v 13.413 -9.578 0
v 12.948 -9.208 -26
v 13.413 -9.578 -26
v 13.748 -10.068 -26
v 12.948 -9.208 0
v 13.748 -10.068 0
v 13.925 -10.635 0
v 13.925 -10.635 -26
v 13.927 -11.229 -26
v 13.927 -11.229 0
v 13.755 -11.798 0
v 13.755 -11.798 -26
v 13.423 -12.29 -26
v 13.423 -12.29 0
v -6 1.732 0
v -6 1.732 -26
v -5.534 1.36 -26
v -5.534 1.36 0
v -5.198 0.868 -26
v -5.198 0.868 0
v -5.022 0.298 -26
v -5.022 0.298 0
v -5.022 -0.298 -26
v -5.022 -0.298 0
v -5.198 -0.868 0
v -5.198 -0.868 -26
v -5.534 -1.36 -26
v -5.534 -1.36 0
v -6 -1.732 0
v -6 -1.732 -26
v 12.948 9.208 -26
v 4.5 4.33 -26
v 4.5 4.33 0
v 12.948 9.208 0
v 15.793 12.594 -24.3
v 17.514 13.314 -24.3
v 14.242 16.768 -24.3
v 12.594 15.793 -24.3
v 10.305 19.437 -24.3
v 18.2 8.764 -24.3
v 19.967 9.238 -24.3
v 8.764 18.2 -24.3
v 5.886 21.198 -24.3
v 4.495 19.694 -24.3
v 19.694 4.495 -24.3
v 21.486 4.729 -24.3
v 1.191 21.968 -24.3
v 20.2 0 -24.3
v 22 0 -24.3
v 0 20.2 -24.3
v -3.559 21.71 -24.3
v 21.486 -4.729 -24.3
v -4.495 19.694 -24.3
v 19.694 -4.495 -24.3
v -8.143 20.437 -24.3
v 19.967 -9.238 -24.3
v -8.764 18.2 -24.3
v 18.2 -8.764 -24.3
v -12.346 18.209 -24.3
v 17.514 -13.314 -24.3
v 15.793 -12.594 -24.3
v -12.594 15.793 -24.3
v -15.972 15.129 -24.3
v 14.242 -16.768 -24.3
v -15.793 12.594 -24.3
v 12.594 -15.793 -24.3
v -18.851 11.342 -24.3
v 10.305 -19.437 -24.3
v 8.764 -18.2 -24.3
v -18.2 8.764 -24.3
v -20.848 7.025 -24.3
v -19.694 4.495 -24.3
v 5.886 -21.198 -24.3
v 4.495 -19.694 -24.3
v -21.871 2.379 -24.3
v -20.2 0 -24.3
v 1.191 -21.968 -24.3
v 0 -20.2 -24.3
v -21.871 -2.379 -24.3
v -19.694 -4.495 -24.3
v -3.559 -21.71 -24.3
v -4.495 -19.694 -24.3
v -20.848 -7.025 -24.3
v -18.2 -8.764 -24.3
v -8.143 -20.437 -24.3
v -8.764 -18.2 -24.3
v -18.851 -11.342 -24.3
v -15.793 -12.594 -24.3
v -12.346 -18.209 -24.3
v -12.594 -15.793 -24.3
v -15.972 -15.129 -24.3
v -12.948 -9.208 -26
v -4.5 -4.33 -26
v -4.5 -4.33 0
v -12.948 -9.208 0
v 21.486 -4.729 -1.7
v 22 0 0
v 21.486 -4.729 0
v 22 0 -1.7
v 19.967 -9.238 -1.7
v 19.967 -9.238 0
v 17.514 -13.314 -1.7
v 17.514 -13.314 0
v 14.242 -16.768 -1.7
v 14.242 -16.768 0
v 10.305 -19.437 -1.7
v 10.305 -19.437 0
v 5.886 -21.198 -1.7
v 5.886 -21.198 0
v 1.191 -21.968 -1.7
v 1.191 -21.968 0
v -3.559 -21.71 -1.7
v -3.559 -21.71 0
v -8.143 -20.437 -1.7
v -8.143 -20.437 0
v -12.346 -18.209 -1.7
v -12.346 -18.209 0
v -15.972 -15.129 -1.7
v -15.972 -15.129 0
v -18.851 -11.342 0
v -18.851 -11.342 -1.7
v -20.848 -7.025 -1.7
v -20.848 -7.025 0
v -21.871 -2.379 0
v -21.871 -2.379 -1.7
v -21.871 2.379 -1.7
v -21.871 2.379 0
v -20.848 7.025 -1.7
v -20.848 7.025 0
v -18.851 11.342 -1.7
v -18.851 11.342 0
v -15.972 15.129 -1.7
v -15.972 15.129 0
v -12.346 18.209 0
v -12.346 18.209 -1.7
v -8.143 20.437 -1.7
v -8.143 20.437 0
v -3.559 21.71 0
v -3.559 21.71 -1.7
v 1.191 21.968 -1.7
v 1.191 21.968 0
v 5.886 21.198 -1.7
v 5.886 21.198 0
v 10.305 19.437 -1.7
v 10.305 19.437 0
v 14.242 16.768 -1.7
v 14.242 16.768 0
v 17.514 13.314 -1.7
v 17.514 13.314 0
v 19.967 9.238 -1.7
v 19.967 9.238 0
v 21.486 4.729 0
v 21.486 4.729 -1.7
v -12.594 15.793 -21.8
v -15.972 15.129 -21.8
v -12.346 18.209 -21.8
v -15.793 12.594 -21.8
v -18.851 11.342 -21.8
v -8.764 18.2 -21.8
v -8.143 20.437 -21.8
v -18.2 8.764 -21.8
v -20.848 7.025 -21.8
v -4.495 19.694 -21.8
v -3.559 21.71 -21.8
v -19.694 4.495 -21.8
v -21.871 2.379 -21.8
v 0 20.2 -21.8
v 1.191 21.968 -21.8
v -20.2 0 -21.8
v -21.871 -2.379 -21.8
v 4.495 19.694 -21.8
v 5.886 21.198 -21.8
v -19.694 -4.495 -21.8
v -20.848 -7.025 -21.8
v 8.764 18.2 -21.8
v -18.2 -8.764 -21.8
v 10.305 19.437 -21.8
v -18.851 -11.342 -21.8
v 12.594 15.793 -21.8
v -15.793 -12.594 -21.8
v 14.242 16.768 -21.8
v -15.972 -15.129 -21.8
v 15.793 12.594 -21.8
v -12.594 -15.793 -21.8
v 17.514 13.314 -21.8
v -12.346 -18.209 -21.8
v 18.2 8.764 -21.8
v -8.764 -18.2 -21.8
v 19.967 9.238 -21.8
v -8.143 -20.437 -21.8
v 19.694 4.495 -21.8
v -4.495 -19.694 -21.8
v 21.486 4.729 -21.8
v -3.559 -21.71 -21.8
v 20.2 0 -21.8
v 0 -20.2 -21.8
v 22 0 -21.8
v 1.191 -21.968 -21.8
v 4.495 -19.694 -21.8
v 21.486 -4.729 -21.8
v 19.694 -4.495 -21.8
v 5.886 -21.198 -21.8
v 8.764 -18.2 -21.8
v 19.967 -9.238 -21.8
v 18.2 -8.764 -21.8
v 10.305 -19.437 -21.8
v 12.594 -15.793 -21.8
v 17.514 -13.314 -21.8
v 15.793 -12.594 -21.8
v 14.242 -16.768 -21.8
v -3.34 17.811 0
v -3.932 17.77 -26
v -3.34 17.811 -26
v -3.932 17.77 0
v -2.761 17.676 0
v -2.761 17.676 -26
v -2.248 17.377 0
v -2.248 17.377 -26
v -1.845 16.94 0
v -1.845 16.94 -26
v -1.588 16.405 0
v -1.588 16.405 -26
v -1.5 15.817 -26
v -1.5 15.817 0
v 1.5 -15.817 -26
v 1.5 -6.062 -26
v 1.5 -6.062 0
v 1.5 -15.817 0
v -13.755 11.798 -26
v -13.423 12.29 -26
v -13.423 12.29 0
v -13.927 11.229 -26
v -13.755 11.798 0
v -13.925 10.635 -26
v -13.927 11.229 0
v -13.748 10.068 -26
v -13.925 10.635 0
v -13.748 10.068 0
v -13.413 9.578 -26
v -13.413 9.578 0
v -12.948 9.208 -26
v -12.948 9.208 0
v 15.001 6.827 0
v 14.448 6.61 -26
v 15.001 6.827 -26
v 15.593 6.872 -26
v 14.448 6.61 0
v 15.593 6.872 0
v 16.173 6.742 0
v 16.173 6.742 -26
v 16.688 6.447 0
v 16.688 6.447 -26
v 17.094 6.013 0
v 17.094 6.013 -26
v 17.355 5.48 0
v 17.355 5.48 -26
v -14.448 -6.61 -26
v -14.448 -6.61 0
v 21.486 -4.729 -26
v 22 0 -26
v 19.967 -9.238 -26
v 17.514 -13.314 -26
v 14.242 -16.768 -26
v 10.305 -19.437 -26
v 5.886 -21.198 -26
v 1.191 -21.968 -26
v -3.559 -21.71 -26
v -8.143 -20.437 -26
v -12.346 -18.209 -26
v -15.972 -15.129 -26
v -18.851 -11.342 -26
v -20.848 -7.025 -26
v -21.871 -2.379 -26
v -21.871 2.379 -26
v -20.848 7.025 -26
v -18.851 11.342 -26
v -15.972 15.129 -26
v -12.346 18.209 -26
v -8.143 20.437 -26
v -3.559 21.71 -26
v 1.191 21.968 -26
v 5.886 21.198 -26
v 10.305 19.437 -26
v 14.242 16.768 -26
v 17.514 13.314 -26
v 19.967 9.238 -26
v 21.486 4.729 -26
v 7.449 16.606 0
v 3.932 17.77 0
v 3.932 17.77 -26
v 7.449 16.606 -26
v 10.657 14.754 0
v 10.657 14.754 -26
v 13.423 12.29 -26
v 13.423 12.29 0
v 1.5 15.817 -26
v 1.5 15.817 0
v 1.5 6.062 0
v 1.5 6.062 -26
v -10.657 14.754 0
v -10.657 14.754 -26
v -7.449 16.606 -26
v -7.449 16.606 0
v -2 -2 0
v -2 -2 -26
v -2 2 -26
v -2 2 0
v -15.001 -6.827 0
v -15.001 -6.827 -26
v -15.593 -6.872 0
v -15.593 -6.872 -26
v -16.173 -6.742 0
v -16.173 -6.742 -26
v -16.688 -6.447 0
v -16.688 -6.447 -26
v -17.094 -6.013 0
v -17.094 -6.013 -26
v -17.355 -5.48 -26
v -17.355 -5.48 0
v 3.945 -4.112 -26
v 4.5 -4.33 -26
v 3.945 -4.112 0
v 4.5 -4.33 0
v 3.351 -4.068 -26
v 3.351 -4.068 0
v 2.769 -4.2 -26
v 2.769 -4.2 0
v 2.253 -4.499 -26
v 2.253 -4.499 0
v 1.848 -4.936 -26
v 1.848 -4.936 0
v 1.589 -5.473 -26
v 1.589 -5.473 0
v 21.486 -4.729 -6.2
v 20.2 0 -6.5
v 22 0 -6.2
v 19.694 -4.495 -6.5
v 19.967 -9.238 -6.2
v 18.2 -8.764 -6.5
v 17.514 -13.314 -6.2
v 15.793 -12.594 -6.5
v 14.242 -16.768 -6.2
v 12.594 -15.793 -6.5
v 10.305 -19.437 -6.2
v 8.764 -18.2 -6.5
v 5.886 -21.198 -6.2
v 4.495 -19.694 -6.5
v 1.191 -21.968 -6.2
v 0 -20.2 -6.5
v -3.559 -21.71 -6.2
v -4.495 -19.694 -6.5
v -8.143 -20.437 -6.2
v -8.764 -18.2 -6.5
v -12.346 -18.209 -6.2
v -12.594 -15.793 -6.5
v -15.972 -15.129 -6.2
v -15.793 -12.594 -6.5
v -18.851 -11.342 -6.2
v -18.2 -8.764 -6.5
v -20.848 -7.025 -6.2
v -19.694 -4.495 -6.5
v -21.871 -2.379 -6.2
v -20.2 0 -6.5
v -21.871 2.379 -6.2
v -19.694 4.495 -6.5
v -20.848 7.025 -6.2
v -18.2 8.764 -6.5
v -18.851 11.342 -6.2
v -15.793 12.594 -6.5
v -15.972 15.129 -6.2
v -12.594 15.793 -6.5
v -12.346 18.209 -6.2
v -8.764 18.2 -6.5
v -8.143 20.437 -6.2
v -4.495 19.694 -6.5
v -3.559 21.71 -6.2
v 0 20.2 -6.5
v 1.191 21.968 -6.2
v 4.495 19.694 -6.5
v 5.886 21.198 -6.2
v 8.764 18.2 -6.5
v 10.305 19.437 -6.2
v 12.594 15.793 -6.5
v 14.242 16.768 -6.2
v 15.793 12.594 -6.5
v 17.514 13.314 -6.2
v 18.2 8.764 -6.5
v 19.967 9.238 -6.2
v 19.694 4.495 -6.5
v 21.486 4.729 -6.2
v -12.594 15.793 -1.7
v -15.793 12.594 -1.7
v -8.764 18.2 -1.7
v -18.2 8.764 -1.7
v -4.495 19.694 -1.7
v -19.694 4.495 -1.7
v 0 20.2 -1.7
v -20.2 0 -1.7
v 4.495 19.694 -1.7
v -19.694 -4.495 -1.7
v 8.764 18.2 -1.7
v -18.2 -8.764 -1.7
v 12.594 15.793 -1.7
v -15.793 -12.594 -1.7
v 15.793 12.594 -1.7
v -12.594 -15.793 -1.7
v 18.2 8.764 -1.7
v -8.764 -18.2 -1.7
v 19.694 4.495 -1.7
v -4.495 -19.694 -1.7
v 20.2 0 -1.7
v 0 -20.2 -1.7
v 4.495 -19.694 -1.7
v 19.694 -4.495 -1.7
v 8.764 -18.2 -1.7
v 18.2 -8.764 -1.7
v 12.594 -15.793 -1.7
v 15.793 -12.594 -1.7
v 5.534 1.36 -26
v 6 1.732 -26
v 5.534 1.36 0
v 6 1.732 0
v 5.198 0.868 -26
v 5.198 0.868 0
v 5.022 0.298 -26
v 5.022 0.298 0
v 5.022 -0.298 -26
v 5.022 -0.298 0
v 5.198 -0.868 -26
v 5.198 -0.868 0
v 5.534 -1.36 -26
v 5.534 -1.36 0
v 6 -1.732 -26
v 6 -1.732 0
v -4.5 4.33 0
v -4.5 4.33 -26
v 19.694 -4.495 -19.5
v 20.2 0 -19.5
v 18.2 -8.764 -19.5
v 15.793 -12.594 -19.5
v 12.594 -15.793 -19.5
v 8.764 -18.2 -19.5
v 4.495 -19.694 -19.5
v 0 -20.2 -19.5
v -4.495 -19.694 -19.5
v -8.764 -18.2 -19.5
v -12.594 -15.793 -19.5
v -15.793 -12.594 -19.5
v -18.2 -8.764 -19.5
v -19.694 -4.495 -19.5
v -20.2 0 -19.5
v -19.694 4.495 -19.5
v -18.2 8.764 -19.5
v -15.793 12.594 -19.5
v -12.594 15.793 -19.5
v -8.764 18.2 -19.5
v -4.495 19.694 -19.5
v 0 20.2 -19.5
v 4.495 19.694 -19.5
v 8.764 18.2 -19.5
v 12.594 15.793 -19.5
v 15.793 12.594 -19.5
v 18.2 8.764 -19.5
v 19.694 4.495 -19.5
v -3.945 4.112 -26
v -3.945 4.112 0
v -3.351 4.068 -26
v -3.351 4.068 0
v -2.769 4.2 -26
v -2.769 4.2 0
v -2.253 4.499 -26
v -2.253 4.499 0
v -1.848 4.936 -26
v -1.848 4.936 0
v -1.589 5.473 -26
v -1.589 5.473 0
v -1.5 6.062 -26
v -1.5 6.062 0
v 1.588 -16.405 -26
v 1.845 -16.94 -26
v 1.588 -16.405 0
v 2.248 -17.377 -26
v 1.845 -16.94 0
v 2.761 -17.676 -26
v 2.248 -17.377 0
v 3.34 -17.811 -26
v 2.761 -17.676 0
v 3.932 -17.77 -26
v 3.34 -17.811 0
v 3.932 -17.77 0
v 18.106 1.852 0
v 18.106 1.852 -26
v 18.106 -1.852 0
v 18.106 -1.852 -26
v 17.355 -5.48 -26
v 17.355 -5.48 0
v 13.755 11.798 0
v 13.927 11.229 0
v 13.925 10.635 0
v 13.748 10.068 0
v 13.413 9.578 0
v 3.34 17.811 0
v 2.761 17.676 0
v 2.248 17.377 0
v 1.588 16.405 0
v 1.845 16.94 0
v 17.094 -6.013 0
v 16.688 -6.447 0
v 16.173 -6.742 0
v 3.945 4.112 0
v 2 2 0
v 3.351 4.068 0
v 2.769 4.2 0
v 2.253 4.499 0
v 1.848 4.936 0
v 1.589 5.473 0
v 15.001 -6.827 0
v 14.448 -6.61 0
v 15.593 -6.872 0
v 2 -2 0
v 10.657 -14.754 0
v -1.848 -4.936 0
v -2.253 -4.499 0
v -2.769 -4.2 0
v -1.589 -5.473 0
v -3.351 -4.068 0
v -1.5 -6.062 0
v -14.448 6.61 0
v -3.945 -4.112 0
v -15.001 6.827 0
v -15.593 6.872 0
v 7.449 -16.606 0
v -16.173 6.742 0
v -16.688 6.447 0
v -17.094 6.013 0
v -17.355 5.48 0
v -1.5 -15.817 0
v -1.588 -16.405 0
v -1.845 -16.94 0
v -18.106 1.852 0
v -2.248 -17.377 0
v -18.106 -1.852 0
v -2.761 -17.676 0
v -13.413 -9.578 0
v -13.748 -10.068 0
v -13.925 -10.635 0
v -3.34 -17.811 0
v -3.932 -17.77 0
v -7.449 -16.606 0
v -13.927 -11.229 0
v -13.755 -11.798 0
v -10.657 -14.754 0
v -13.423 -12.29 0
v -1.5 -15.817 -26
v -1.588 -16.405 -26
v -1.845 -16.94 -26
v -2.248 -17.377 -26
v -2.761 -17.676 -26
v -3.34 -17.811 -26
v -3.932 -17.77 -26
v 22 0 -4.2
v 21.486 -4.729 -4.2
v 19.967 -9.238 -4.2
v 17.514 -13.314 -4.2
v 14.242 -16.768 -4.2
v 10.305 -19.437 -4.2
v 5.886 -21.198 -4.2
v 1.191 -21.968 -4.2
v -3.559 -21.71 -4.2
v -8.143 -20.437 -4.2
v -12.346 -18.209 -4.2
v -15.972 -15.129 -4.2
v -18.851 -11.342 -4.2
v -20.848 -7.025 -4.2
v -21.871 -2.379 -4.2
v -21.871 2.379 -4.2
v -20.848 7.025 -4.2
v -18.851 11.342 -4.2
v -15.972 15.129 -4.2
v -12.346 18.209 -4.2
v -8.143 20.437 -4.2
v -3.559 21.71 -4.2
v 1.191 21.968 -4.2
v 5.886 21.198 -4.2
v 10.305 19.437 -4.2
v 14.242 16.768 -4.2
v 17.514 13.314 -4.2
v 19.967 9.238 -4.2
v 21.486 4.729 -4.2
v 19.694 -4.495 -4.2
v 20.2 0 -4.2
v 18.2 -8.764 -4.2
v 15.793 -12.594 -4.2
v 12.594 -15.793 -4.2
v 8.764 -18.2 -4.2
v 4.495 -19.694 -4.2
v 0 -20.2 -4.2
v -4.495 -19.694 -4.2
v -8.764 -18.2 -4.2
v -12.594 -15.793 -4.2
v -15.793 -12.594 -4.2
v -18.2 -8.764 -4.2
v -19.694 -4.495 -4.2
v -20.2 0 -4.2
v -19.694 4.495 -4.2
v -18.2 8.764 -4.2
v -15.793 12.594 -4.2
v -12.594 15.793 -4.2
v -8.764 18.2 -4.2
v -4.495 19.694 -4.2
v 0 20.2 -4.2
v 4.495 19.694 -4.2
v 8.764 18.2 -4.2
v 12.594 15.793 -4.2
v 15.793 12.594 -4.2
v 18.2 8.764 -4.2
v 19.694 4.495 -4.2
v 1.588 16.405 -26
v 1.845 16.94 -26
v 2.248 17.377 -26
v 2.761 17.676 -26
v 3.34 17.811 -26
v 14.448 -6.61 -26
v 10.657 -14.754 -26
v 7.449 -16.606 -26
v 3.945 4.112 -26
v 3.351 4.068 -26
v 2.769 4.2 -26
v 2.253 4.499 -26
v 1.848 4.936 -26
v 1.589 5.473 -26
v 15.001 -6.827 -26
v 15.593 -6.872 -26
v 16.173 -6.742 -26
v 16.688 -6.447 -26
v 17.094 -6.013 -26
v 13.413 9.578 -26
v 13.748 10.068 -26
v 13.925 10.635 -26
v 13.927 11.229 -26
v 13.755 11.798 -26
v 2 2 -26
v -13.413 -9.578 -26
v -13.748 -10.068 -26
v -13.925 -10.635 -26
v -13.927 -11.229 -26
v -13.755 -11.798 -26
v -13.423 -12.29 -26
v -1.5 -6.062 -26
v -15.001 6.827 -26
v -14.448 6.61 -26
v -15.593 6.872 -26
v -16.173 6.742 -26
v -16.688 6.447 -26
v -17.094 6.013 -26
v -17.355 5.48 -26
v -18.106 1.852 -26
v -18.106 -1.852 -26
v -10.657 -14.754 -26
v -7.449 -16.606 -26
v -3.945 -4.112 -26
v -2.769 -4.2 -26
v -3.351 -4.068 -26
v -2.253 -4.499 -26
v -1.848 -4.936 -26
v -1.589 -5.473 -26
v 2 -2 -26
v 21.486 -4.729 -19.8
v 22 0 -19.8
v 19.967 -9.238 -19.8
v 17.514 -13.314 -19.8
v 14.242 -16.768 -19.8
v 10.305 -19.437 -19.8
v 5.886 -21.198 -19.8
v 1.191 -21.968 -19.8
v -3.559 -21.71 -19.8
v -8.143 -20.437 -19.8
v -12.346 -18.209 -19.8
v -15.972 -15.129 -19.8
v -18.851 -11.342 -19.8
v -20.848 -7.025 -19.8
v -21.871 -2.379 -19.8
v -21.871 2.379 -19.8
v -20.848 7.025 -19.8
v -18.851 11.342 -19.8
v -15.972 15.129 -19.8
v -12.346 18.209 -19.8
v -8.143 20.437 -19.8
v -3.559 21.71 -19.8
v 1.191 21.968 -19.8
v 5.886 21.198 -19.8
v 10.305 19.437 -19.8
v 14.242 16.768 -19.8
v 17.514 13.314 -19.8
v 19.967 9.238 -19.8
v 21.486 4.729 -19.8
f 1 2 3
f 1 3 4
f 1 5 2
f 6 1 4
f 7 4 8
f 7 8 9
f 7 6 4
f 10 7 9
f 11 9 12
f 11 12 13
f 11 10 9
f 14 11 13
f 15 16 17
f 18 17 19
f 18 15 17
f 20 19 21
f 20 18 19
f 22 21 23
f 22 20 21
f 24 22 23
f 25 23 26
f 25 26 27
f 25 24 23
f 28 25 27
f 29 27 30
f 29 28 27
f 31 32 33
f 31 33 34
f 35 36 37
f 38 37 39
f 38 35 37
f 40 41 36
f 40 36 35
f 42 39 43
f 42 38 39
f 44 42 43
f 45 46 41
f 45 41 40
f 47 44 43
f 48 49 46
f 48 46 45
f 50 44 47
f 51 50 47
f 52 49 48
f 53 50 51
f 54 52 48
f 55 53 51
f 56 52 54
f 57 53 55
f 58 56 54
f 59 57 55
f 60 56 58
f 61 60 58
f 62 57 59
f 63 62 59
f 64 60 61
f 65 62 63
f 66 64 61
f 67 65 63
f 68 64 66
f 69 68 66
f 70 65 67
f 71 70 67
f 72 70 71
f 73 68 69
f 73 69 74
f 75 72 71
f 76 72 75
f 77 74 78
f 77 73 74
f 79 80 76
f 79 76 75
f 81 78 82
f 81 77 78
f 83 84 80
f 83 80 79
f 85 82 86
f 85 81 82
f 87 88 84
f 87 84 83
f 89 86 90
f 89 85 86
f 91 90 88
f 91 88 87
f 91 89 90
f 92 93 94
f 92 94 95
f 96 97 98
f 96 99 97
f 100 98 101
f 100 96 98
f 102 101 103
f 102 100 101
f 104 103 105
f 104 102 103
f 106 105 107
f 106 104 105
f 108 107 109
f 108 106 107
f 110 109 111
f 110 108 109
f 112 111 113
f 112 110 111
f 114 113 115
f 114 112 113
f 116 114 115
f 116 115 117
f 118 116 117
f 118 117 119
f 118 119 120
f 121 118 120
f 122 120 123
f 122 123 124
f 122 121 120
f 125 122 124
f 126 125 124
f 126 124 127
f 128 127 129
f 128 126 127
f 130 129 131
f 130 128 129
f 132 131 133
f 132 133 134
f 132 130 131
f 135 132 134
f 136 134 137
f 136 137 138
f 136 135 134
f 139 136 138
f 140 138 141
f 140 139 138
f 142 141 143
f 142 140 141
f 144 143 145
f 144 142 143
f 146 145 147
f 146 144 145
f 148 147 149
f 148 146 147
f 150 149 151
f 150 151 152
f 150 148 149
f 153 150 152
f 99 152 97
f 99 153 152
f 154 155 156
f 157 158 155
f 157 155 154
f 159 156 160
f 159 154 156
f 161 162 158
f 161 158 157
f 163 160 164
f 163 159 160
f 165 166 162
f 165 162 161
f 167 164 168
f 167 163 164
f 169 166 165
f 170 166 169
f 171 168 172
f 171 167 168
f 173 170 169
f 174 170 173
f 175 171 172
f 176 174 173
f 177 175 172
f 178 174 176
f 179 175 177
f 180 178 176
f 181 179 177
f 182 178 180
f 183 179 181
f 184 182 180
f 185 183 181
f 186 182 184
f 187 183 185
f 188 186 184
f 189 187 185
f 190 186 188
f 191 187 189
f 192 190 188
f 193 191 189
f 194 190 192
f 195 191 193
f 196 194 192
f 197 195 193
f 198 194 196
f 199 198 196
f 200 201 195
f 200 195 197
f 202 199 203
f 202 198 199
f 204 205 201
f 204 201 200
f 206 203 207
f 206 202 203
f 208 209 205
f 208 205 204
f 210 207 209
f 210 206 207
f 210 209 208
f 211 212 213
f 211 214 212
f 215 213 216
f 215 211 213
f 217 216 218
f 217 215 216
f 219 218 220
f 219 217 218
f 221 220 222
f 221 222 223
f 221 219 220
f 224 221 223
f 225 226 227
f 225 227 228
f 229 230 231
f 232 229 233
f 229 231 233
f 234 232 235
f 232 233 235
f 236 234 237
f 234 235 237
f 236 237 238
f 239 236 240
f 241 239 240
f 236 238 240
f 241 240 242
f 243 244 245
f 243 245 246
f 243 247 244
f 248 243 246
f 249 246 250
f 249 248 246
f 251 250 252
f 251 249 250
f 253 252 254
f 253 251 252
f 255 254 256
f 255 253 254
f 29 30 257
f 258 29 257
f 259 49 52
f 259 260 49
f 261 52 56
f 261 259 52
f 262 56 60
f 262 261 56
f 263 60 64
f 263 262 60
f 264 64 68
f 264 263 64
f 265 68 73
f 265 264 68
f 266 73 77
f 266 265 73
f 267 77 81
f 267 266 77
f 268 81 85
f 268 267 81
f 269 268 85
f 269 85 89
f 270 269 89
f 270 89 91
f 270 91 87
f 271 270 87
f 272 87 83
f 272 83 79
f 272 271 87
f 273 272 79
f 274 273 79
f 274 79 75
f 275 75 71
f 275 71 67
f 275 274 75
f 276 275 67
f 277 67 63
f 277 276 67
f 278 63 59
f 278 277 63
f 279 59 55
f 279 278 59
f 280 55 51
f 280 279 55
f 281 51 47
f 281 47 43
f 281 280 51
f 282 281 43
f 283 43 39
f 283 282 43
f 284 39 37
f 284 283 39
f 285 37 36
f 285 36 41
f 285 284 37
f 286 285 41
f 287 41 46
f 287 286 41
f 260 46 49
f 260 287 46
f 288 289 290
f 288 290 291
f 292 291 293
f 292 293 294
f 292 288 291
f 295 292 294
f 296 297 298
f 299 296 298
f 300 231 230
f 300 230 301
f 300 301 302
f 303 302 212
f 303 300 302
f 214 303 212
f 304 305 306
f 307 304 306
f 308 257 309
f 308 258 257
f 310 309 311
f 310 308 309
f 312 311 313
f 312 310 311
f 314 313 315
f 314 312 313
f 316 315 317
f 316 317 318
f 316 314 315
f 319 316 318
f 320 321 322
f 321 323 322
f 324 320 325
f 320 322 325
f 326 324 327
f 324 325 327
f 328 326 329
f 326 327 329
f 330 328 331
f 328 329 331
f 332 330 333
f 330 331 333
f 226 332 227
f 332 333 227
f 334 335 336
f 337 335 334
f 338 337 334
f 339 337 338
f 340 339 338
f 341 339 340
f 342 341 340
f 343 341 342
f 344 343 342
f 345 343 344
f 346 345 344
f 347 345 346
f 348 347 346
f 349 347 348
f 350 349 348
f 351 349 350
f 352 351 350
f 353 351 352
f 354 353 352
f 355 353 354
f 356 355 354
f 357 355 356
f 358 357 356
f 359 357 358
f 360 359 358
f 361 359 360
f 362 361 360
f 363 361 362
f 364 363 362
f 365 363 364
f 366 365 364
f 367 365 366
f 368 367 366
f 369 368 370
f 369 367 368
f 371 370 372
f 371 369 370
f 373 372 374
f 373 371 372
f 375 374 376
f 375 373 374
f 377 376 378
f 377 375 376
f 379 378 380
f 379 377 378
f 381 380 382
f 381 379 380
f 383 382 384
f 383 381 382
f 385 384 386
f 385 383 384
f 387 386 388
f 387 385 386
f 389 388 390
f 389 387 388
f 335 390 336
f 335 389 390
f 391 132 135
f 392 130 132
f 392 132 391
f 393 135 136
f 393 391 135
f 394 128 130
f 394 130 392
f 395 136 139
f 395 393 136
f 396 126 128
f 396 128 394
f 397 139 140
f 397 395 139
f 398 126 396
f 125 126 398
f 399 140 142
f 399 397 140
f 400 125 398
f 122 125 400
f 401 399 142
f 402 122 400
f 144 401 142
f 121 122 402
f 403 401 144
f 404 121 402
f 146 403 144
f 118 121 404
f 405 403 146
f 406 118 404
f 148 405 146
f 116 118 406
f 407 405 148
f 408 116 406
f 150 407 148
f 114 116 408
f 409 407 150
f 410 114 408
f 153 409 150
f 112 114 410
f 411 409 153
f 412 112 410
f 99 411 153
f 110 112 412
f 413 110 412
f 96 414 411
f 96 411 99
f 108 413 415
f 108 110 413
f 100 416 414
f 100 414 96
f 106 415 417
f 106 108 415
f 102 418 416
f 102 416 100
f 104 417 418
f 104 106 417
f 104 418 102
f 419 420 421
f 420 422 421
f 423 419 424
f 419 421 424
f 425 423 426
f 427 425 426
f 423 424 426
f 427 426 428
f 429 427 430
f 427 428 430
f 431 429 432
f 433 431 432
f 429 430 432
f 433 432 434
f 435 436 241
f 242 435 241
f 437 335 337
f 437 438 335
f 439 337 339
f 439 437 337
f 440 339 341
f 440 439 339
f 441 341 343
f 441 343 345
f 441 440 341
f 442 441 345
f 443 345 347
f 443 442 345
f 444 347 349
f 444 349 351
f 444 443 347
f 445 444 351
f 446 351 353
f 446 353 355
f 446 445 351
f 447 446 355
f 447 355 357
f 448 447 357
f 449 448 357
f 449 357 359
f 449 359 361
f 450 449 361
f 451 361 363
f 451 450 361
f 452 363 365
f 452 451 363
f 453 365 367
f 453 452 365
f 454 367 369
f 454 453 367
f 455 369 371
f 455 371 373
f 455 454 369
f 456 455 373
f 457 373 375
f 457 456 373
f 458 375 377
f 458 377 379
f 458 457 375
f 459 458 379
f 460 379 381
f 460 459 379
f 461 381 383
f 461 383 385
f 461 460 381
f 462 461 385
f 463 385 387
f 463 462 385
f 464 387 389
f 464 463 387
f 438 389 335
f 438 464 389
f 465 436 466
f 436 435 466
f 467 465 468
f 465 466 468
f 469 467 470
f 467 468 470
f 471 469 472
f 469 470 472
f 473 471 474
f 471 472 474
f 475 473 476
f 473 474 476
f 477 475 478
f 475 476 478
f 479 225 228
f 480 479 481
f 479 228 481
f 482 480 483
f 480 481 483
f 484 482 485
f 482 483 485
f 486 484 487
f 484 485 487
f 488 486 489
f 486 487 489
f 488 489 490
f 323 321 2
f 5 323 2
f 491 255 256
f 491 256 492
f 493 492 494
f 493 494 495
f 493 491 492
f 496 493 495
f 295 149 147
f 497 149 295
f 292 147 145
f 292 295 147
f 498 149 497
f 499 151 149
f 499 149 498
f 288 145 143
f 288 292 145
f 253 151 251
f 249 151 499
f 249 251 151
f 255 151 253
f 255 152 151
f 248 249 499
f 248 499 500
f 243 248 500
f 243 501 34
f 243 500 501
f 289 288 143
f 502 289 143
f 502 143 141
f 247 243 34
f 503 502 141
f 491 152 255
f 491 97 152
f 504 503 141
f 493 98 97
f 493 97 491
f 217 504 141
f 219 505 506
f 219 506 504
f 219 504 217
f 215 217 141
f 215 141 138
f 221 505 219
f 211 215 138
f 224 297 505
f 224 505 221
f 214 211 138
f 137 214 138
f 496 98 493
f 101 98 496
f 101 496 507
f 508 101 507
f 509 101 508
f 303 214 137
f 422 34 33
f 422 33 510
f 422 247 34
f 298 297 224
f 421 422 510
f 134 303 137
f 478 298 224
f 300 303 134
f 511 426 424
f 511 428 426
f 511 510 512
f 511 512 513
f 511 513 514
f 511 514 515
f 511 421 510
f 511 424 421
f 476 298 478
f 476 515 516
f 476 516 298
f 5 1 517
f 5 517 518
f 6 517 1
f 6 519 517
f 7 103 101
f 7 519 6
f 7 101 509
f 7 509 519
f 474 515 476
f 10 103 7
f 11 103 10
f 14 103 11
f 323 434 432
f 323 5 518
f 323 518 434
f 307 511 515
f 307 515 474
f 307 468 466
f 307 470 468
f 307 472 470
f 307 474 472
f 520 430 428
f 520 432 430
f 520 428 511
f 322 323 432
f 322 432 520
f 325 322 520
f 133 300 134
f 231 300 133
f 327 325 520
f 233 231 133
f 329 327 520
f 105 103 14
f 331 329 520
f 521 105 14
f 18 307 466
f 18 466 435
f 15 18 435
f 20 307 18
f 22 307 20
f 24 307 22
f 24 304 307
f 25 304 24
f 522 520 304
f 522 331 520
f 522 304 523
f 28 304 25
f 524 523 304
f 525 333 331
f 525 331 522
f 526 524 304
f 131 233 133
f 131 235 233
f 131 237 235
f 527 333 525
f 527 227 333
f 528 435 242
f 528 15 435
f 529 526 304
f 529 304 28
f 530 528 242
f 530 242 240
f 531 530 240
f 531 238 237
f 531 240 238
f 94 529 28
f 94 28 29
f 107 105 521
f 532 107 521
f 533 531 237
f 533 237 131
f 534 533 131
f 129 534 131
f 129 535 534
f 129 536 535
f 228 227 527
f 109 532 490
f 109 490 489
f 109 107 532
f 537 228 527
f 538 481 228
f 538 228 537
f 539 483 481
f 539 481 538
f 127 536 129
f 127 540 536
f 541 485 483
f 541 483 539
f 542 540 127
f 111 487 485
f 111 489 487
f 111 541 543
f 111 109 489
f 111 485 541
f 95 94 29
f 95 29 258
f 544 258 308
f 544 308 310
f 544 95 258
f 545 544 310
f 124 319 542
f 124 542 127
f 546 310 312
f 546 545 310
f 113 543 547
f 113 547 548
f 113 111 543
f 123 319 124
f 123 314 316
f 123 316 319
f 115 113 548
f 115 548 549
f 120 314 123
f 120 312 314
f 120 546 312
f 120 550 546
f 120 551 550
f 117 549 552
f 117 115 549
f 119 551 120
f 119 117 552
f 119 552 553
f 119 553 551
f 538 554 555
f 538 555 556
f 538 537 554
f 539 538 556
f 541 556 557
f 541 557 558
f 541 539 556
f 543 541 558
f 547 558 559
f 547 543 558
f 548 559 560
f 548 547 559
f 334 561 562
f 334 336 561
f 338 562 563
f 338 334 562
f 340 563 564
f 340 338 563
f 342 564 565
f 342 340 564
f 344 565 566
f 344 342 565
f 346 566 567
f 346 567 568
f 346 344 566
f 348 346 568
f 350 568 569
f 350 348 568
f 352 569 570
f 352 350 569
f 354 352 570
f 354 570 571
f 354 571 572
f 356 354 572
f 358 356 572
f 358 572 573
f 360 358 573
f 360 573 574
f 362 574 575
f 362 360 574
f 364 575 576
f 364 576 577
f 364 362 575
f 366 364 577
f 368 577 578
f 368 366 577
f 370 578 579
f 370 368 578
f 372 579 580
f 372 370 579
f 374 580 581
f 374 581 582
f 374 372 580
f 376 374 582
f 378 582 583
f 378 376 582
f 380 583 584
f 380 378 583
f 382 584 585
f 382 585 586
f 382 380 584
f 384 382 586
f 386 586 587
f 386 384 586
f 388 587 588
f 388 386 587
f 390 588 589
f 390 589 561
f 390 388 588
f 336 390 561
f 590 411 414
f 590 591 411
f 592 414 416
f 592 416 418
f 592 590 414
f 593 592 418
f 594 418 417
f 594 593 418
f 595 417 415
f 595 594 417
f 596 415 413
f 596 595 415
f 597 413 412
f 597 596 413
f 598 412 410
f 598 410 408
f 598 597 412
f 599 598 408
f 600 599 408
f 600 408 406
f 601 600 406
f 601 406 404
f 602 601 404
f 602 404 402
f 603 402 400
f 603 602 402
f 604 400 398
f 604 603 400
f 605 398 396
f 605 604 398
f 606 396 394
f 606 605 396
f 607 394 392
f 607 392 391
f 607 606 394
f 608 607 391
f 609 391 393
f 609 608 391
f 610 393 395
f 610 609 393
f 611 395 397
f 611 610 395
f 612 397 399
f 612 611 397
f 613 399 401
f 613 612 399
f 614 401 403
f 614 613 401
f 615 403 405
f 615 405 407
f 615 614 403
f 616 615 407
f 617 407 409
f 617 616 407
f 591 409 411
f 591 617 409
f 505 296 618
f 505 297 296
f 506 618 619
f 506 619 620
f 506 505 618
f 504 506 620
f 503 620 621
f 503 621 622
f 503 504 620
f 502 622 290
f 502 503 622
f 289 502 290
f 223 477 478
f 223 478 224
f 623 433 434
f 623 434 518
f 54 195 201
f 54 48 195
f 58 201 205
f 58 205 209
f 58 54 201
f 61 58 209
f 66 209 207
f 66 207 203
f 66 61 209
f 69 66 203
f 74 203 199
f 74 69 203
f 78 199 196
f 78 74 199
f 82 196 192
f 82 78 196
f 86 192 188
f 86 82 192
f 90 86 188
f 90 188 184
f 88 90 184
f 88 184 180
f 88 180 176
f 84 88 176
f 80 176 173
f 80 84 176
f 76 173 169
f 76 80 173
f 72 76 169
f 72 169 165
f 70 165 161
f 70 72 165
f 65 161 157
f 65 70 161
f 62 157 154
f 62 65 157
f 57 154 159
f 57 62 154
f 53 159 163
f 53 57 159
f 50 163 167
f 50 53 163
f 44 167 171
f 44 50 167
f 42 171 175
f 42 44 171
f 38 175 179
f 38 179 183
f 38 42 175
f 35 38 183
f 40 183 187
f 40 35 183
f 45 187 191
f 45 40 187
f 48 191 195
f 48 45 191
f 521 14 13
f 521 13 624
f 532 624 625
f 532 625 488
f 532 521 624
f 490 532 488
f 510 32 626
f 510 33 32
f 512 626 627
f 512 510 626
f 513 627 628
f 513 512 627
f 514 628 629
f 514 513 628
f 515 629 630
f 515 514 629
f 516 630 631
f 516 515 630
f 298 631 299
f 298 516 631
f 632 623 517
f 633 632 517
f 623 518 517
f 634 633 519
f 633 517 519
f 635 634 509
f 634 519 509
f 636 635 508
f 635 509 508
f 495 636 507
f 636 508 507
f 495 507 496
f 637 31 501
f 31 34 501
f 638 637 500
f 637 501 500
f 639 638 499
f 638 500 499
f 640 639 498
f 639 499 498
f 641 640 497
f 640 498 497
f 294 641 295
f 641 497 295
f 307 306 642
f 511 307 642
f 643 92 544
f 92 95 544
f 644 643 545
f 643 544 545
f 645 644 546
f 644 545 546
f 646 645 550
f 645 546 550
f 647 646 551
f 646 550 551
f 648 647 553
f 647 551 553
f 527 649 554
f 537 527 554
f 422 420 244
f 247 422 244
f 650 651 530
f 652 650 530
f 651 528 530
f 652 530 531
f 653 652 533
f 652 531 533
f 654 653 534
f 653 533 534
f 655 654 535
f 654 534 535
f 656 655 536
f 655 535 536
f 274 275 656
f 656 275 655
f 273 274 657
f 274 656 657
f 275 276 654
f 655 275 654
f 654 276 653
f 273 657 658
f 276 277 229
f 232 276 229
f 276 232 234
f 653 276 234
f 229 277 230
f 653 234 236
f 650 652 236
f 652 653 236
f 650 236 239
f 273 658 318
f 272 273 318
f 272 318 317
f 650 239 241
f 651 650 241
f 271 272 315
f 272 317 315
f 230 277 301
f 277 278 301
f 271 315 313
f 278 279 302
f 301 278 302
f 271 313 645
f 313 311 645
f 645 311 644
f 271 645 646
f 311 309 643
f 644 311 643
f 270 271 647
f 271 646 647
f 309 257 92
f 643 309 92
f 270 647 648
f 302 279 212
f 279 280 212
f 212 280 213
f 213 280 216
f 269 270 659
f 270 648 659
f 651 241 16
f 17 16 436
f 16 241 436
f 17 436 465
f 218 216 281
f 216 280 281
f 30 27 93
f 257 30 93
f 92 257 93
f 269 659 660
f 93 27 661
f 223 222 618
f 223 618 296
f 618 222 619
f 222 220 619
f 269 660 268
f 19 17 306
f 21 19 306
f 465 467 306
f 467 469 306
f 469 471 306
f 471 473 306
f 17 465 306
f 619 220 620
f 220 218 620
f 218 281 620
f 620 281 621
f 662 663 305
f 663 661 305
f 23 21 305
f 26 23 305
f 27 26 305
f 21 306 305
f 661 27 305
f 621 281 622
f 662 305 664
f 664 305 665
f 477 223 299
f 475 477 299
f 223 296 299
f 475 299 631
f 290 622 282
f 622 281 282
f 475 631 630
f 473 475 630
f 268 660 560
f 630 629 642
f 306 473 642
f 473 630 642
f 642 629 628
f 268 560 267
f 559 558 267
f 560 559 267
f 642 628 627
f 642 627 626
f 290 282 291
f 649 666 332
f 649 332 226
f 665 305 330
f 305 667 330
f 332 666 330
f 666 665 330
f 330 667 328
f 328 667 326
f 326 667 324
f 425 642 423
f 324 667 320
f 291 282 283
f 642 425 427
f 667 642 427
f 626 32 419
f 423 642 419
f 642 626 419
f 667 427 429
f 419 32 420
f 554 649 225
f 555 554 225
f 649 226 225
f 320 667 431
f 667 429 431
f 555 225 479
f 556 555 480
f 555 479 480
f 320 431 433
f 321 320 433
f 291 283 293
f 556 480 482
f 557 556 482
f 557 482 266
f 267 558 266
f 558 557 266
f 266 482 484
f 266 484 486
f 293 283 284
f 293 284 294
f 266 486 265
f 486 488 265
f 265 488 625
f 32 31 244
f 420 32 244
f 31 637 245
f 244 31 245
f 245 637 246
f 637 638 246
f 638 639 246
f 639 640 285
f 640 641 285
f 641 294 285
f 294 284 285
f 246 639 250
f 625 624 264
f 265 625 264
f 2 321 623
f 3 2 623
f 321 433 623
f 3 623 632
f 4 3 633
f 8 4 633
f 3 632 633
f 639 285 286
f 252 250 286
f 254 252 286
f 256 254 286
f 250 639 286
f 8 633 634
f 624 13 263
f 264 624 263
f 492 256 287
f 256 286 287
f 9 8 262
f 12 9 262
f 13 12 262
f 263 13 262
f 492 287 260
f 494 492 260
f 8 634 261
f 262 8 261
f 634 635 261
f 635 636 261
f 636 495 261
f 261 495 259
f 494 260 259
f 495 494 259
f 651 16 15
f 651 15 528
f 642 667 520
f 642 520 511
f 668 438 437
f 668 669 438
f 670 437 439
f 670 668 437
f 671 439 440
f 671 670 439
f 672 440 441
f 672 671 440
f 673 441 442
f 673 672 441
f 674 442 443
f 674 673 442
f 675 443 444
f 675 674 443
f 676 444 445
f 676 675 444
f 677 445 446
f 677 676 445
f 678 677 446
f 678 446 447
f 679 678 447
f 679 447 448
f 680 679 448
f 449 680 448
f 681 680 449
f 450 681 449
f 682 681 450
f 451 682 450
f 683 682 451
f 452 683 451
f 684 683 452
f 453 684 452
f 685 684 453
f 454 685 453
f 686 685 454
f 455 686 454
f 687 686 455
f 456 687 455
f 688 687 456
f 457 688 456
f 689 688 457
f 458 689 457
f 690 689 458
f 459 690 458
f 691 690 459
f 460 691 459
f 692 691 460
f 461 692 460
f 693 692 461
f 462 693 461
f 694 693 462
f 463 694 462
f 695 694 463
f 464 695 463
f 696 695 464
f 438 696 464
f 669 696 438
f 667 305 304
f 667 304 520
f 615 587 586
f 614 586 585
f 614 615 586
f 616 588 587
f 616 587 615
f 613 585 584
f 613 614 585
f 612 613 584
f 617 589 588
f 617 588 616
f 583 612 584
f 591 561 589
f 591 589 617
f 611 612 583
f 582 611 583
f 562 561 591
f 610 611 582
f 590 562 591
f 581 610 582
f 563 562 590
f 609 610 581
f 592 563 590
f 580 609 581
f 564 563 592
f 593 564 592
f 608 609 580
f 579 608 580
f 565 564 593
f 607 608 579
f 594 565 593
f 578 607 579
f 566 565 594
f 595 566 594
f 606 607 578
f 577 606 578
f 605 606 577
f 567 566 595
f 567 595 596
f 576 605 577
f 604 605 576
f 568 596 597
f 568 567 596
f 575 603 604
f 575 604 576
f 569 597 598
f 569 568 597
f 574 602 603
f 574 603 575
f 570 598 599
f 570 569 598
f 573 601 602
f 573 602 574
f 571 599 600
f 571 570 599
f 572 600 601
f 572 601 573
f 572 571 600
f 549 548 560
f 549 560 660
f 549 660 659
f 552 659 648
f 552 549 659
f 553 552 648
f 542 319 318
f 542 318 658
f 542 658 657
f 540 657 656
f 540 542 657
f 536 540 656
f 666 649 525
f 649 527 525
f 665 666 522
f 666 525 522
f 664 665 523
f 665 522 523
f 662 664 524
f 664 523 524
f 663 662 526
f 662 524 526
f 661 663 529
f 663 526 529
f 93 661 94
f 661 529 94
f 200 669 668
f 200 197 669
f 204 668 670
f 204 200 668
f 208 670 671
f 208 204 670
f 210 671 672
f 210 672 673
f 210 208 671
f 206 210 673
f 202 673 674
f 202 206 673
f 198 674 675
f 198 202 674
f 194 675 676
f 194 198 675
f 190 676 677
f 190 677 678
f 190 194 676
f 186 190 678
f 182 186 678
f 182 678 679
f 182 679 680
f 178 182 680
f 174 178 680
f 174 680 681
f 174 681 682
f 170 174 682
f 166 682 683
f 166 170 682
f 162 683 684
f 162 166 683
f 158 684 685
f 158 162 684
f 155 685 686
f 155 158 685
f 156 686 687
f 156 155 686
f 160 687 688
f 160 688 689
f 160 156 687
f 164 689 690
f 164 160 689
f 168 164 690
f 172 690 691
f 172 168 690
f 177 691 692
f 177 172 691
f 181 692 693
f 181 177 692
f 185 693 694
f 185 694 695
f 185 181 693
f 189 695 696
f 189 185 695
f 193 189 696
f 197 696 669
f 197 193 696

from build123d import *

# Parameters (mm, degrees)
SKETCH2_W               = 3
SKETCH2_H               = 18.2
BOSS_EXTRUDE1_DEPTH     = 26
CIRPATTERN1_COUNT       = 6
CUT_EXTRUDE1_DEPTH      = 41.546269865
CUT_EXTRUDE1_DEPTH_BACK = 41.546269865
SKETCH3_W               = 4
SKETCH3_H               = 4
FILLET1_R               = 2


with BuildPart() as part:
    # Sketch1 → Revolve1 (revolve)
    with BuildSketch(Plane(origin=(0, 0, 0), x_dir=(0, 0, -1), z_dir=(1, 0, 0)), mode=Mode.PRIVATE) as revolve1_sk:
        Polygon((0, 22), (1.7, 22), (1.7, 20.2), (4.2, 20.2), (4.2, 22), (6.2, 22), (6.5, 20.2), (19.5, 20.2), (19.8, 22), (21.8, 22), (21.8, 20.2), (24.3, 20.2), (24.3, 22), (26, 22), (26, 18.2), (0, 18.2), align=None)
    revolve(revolve1_sk.sketch.rotate(Axis((0, 0, 0.322174052), (0, 0, -1)), 90), axis=Axis((0, 0, 0.322174052), (0, 0, -1)))

    # Sketch2 → Boss-Extrude1 (add)
    with BuildSketch(Plane.XY):
        with Locations((0, 9.1)):
            Rectangle(SKETCH2_W, SKETCH2_H)
    boss_extrude1 = extrude(amount=-BOSS_EXTRUDE1_DEPTH)

    # CirPattern1: Boss-Extrude1 ×6 about axis
    cirpattern1_axis = Axis((0, 0, 0), (0, 0, 1))
    for i in range(1, CIRPATTERN1_COUNT):
        add(boss_extrude1.rotate(cirpattern1_axis, i * 360 / CIRPATTERN1_COUNT))

    # Sketch3 → Cut-Extrude1 (cut, two sides: drawn at the far end of the back side and taken through both)
    with BuildSketch(Plane.XY.offset(-CUT_EXTRUDE1_DEPTH_BACK)):
        Rectangle(SKETCH3_W, SKETCH3_H)
    extrude(amount=CUT_EXTRUDE1_DEPTH + CUT_EXTRUDE1_DEPTH_BACK, mode=Mode.SUBTRACT)

    # Fillet1
    fillet1_edges = [part.edges().sort_by_distance(p)[0] for p in [
        (3, 0, -13),
        (1.5, -2.598076211, -13),
        (-1.5, -2.598076211, -13),
        (-3, 0, -13),
        (16.458039343, 7.770002637, -13),
        (14.958039343, 10.368078849, -13),
        (16.458039343, -7.770002637, -13),
        (14.958039343, -10.368078849, -13),
        (-14.958039343, 10.368078849, -13),
        (-1.5, -18.138081486, -13),
        (1.5, -18.138081486, -13),
        (-16.458039343, -7.770002637, -13),
        (-14.958039343, -10.368078849, -13),
        (-16.458039343, 7.770002637, -13),
        (1.5, 18.138081486, -13),
        (-1.5, 18.138081486, -13),
        (-1.5, 2.598076211, -13),
        (1.5, 2.598076211, -13),
    ]]
    fillet(fillet1_edges, radius=FILLET1_R)


solid = part.part
